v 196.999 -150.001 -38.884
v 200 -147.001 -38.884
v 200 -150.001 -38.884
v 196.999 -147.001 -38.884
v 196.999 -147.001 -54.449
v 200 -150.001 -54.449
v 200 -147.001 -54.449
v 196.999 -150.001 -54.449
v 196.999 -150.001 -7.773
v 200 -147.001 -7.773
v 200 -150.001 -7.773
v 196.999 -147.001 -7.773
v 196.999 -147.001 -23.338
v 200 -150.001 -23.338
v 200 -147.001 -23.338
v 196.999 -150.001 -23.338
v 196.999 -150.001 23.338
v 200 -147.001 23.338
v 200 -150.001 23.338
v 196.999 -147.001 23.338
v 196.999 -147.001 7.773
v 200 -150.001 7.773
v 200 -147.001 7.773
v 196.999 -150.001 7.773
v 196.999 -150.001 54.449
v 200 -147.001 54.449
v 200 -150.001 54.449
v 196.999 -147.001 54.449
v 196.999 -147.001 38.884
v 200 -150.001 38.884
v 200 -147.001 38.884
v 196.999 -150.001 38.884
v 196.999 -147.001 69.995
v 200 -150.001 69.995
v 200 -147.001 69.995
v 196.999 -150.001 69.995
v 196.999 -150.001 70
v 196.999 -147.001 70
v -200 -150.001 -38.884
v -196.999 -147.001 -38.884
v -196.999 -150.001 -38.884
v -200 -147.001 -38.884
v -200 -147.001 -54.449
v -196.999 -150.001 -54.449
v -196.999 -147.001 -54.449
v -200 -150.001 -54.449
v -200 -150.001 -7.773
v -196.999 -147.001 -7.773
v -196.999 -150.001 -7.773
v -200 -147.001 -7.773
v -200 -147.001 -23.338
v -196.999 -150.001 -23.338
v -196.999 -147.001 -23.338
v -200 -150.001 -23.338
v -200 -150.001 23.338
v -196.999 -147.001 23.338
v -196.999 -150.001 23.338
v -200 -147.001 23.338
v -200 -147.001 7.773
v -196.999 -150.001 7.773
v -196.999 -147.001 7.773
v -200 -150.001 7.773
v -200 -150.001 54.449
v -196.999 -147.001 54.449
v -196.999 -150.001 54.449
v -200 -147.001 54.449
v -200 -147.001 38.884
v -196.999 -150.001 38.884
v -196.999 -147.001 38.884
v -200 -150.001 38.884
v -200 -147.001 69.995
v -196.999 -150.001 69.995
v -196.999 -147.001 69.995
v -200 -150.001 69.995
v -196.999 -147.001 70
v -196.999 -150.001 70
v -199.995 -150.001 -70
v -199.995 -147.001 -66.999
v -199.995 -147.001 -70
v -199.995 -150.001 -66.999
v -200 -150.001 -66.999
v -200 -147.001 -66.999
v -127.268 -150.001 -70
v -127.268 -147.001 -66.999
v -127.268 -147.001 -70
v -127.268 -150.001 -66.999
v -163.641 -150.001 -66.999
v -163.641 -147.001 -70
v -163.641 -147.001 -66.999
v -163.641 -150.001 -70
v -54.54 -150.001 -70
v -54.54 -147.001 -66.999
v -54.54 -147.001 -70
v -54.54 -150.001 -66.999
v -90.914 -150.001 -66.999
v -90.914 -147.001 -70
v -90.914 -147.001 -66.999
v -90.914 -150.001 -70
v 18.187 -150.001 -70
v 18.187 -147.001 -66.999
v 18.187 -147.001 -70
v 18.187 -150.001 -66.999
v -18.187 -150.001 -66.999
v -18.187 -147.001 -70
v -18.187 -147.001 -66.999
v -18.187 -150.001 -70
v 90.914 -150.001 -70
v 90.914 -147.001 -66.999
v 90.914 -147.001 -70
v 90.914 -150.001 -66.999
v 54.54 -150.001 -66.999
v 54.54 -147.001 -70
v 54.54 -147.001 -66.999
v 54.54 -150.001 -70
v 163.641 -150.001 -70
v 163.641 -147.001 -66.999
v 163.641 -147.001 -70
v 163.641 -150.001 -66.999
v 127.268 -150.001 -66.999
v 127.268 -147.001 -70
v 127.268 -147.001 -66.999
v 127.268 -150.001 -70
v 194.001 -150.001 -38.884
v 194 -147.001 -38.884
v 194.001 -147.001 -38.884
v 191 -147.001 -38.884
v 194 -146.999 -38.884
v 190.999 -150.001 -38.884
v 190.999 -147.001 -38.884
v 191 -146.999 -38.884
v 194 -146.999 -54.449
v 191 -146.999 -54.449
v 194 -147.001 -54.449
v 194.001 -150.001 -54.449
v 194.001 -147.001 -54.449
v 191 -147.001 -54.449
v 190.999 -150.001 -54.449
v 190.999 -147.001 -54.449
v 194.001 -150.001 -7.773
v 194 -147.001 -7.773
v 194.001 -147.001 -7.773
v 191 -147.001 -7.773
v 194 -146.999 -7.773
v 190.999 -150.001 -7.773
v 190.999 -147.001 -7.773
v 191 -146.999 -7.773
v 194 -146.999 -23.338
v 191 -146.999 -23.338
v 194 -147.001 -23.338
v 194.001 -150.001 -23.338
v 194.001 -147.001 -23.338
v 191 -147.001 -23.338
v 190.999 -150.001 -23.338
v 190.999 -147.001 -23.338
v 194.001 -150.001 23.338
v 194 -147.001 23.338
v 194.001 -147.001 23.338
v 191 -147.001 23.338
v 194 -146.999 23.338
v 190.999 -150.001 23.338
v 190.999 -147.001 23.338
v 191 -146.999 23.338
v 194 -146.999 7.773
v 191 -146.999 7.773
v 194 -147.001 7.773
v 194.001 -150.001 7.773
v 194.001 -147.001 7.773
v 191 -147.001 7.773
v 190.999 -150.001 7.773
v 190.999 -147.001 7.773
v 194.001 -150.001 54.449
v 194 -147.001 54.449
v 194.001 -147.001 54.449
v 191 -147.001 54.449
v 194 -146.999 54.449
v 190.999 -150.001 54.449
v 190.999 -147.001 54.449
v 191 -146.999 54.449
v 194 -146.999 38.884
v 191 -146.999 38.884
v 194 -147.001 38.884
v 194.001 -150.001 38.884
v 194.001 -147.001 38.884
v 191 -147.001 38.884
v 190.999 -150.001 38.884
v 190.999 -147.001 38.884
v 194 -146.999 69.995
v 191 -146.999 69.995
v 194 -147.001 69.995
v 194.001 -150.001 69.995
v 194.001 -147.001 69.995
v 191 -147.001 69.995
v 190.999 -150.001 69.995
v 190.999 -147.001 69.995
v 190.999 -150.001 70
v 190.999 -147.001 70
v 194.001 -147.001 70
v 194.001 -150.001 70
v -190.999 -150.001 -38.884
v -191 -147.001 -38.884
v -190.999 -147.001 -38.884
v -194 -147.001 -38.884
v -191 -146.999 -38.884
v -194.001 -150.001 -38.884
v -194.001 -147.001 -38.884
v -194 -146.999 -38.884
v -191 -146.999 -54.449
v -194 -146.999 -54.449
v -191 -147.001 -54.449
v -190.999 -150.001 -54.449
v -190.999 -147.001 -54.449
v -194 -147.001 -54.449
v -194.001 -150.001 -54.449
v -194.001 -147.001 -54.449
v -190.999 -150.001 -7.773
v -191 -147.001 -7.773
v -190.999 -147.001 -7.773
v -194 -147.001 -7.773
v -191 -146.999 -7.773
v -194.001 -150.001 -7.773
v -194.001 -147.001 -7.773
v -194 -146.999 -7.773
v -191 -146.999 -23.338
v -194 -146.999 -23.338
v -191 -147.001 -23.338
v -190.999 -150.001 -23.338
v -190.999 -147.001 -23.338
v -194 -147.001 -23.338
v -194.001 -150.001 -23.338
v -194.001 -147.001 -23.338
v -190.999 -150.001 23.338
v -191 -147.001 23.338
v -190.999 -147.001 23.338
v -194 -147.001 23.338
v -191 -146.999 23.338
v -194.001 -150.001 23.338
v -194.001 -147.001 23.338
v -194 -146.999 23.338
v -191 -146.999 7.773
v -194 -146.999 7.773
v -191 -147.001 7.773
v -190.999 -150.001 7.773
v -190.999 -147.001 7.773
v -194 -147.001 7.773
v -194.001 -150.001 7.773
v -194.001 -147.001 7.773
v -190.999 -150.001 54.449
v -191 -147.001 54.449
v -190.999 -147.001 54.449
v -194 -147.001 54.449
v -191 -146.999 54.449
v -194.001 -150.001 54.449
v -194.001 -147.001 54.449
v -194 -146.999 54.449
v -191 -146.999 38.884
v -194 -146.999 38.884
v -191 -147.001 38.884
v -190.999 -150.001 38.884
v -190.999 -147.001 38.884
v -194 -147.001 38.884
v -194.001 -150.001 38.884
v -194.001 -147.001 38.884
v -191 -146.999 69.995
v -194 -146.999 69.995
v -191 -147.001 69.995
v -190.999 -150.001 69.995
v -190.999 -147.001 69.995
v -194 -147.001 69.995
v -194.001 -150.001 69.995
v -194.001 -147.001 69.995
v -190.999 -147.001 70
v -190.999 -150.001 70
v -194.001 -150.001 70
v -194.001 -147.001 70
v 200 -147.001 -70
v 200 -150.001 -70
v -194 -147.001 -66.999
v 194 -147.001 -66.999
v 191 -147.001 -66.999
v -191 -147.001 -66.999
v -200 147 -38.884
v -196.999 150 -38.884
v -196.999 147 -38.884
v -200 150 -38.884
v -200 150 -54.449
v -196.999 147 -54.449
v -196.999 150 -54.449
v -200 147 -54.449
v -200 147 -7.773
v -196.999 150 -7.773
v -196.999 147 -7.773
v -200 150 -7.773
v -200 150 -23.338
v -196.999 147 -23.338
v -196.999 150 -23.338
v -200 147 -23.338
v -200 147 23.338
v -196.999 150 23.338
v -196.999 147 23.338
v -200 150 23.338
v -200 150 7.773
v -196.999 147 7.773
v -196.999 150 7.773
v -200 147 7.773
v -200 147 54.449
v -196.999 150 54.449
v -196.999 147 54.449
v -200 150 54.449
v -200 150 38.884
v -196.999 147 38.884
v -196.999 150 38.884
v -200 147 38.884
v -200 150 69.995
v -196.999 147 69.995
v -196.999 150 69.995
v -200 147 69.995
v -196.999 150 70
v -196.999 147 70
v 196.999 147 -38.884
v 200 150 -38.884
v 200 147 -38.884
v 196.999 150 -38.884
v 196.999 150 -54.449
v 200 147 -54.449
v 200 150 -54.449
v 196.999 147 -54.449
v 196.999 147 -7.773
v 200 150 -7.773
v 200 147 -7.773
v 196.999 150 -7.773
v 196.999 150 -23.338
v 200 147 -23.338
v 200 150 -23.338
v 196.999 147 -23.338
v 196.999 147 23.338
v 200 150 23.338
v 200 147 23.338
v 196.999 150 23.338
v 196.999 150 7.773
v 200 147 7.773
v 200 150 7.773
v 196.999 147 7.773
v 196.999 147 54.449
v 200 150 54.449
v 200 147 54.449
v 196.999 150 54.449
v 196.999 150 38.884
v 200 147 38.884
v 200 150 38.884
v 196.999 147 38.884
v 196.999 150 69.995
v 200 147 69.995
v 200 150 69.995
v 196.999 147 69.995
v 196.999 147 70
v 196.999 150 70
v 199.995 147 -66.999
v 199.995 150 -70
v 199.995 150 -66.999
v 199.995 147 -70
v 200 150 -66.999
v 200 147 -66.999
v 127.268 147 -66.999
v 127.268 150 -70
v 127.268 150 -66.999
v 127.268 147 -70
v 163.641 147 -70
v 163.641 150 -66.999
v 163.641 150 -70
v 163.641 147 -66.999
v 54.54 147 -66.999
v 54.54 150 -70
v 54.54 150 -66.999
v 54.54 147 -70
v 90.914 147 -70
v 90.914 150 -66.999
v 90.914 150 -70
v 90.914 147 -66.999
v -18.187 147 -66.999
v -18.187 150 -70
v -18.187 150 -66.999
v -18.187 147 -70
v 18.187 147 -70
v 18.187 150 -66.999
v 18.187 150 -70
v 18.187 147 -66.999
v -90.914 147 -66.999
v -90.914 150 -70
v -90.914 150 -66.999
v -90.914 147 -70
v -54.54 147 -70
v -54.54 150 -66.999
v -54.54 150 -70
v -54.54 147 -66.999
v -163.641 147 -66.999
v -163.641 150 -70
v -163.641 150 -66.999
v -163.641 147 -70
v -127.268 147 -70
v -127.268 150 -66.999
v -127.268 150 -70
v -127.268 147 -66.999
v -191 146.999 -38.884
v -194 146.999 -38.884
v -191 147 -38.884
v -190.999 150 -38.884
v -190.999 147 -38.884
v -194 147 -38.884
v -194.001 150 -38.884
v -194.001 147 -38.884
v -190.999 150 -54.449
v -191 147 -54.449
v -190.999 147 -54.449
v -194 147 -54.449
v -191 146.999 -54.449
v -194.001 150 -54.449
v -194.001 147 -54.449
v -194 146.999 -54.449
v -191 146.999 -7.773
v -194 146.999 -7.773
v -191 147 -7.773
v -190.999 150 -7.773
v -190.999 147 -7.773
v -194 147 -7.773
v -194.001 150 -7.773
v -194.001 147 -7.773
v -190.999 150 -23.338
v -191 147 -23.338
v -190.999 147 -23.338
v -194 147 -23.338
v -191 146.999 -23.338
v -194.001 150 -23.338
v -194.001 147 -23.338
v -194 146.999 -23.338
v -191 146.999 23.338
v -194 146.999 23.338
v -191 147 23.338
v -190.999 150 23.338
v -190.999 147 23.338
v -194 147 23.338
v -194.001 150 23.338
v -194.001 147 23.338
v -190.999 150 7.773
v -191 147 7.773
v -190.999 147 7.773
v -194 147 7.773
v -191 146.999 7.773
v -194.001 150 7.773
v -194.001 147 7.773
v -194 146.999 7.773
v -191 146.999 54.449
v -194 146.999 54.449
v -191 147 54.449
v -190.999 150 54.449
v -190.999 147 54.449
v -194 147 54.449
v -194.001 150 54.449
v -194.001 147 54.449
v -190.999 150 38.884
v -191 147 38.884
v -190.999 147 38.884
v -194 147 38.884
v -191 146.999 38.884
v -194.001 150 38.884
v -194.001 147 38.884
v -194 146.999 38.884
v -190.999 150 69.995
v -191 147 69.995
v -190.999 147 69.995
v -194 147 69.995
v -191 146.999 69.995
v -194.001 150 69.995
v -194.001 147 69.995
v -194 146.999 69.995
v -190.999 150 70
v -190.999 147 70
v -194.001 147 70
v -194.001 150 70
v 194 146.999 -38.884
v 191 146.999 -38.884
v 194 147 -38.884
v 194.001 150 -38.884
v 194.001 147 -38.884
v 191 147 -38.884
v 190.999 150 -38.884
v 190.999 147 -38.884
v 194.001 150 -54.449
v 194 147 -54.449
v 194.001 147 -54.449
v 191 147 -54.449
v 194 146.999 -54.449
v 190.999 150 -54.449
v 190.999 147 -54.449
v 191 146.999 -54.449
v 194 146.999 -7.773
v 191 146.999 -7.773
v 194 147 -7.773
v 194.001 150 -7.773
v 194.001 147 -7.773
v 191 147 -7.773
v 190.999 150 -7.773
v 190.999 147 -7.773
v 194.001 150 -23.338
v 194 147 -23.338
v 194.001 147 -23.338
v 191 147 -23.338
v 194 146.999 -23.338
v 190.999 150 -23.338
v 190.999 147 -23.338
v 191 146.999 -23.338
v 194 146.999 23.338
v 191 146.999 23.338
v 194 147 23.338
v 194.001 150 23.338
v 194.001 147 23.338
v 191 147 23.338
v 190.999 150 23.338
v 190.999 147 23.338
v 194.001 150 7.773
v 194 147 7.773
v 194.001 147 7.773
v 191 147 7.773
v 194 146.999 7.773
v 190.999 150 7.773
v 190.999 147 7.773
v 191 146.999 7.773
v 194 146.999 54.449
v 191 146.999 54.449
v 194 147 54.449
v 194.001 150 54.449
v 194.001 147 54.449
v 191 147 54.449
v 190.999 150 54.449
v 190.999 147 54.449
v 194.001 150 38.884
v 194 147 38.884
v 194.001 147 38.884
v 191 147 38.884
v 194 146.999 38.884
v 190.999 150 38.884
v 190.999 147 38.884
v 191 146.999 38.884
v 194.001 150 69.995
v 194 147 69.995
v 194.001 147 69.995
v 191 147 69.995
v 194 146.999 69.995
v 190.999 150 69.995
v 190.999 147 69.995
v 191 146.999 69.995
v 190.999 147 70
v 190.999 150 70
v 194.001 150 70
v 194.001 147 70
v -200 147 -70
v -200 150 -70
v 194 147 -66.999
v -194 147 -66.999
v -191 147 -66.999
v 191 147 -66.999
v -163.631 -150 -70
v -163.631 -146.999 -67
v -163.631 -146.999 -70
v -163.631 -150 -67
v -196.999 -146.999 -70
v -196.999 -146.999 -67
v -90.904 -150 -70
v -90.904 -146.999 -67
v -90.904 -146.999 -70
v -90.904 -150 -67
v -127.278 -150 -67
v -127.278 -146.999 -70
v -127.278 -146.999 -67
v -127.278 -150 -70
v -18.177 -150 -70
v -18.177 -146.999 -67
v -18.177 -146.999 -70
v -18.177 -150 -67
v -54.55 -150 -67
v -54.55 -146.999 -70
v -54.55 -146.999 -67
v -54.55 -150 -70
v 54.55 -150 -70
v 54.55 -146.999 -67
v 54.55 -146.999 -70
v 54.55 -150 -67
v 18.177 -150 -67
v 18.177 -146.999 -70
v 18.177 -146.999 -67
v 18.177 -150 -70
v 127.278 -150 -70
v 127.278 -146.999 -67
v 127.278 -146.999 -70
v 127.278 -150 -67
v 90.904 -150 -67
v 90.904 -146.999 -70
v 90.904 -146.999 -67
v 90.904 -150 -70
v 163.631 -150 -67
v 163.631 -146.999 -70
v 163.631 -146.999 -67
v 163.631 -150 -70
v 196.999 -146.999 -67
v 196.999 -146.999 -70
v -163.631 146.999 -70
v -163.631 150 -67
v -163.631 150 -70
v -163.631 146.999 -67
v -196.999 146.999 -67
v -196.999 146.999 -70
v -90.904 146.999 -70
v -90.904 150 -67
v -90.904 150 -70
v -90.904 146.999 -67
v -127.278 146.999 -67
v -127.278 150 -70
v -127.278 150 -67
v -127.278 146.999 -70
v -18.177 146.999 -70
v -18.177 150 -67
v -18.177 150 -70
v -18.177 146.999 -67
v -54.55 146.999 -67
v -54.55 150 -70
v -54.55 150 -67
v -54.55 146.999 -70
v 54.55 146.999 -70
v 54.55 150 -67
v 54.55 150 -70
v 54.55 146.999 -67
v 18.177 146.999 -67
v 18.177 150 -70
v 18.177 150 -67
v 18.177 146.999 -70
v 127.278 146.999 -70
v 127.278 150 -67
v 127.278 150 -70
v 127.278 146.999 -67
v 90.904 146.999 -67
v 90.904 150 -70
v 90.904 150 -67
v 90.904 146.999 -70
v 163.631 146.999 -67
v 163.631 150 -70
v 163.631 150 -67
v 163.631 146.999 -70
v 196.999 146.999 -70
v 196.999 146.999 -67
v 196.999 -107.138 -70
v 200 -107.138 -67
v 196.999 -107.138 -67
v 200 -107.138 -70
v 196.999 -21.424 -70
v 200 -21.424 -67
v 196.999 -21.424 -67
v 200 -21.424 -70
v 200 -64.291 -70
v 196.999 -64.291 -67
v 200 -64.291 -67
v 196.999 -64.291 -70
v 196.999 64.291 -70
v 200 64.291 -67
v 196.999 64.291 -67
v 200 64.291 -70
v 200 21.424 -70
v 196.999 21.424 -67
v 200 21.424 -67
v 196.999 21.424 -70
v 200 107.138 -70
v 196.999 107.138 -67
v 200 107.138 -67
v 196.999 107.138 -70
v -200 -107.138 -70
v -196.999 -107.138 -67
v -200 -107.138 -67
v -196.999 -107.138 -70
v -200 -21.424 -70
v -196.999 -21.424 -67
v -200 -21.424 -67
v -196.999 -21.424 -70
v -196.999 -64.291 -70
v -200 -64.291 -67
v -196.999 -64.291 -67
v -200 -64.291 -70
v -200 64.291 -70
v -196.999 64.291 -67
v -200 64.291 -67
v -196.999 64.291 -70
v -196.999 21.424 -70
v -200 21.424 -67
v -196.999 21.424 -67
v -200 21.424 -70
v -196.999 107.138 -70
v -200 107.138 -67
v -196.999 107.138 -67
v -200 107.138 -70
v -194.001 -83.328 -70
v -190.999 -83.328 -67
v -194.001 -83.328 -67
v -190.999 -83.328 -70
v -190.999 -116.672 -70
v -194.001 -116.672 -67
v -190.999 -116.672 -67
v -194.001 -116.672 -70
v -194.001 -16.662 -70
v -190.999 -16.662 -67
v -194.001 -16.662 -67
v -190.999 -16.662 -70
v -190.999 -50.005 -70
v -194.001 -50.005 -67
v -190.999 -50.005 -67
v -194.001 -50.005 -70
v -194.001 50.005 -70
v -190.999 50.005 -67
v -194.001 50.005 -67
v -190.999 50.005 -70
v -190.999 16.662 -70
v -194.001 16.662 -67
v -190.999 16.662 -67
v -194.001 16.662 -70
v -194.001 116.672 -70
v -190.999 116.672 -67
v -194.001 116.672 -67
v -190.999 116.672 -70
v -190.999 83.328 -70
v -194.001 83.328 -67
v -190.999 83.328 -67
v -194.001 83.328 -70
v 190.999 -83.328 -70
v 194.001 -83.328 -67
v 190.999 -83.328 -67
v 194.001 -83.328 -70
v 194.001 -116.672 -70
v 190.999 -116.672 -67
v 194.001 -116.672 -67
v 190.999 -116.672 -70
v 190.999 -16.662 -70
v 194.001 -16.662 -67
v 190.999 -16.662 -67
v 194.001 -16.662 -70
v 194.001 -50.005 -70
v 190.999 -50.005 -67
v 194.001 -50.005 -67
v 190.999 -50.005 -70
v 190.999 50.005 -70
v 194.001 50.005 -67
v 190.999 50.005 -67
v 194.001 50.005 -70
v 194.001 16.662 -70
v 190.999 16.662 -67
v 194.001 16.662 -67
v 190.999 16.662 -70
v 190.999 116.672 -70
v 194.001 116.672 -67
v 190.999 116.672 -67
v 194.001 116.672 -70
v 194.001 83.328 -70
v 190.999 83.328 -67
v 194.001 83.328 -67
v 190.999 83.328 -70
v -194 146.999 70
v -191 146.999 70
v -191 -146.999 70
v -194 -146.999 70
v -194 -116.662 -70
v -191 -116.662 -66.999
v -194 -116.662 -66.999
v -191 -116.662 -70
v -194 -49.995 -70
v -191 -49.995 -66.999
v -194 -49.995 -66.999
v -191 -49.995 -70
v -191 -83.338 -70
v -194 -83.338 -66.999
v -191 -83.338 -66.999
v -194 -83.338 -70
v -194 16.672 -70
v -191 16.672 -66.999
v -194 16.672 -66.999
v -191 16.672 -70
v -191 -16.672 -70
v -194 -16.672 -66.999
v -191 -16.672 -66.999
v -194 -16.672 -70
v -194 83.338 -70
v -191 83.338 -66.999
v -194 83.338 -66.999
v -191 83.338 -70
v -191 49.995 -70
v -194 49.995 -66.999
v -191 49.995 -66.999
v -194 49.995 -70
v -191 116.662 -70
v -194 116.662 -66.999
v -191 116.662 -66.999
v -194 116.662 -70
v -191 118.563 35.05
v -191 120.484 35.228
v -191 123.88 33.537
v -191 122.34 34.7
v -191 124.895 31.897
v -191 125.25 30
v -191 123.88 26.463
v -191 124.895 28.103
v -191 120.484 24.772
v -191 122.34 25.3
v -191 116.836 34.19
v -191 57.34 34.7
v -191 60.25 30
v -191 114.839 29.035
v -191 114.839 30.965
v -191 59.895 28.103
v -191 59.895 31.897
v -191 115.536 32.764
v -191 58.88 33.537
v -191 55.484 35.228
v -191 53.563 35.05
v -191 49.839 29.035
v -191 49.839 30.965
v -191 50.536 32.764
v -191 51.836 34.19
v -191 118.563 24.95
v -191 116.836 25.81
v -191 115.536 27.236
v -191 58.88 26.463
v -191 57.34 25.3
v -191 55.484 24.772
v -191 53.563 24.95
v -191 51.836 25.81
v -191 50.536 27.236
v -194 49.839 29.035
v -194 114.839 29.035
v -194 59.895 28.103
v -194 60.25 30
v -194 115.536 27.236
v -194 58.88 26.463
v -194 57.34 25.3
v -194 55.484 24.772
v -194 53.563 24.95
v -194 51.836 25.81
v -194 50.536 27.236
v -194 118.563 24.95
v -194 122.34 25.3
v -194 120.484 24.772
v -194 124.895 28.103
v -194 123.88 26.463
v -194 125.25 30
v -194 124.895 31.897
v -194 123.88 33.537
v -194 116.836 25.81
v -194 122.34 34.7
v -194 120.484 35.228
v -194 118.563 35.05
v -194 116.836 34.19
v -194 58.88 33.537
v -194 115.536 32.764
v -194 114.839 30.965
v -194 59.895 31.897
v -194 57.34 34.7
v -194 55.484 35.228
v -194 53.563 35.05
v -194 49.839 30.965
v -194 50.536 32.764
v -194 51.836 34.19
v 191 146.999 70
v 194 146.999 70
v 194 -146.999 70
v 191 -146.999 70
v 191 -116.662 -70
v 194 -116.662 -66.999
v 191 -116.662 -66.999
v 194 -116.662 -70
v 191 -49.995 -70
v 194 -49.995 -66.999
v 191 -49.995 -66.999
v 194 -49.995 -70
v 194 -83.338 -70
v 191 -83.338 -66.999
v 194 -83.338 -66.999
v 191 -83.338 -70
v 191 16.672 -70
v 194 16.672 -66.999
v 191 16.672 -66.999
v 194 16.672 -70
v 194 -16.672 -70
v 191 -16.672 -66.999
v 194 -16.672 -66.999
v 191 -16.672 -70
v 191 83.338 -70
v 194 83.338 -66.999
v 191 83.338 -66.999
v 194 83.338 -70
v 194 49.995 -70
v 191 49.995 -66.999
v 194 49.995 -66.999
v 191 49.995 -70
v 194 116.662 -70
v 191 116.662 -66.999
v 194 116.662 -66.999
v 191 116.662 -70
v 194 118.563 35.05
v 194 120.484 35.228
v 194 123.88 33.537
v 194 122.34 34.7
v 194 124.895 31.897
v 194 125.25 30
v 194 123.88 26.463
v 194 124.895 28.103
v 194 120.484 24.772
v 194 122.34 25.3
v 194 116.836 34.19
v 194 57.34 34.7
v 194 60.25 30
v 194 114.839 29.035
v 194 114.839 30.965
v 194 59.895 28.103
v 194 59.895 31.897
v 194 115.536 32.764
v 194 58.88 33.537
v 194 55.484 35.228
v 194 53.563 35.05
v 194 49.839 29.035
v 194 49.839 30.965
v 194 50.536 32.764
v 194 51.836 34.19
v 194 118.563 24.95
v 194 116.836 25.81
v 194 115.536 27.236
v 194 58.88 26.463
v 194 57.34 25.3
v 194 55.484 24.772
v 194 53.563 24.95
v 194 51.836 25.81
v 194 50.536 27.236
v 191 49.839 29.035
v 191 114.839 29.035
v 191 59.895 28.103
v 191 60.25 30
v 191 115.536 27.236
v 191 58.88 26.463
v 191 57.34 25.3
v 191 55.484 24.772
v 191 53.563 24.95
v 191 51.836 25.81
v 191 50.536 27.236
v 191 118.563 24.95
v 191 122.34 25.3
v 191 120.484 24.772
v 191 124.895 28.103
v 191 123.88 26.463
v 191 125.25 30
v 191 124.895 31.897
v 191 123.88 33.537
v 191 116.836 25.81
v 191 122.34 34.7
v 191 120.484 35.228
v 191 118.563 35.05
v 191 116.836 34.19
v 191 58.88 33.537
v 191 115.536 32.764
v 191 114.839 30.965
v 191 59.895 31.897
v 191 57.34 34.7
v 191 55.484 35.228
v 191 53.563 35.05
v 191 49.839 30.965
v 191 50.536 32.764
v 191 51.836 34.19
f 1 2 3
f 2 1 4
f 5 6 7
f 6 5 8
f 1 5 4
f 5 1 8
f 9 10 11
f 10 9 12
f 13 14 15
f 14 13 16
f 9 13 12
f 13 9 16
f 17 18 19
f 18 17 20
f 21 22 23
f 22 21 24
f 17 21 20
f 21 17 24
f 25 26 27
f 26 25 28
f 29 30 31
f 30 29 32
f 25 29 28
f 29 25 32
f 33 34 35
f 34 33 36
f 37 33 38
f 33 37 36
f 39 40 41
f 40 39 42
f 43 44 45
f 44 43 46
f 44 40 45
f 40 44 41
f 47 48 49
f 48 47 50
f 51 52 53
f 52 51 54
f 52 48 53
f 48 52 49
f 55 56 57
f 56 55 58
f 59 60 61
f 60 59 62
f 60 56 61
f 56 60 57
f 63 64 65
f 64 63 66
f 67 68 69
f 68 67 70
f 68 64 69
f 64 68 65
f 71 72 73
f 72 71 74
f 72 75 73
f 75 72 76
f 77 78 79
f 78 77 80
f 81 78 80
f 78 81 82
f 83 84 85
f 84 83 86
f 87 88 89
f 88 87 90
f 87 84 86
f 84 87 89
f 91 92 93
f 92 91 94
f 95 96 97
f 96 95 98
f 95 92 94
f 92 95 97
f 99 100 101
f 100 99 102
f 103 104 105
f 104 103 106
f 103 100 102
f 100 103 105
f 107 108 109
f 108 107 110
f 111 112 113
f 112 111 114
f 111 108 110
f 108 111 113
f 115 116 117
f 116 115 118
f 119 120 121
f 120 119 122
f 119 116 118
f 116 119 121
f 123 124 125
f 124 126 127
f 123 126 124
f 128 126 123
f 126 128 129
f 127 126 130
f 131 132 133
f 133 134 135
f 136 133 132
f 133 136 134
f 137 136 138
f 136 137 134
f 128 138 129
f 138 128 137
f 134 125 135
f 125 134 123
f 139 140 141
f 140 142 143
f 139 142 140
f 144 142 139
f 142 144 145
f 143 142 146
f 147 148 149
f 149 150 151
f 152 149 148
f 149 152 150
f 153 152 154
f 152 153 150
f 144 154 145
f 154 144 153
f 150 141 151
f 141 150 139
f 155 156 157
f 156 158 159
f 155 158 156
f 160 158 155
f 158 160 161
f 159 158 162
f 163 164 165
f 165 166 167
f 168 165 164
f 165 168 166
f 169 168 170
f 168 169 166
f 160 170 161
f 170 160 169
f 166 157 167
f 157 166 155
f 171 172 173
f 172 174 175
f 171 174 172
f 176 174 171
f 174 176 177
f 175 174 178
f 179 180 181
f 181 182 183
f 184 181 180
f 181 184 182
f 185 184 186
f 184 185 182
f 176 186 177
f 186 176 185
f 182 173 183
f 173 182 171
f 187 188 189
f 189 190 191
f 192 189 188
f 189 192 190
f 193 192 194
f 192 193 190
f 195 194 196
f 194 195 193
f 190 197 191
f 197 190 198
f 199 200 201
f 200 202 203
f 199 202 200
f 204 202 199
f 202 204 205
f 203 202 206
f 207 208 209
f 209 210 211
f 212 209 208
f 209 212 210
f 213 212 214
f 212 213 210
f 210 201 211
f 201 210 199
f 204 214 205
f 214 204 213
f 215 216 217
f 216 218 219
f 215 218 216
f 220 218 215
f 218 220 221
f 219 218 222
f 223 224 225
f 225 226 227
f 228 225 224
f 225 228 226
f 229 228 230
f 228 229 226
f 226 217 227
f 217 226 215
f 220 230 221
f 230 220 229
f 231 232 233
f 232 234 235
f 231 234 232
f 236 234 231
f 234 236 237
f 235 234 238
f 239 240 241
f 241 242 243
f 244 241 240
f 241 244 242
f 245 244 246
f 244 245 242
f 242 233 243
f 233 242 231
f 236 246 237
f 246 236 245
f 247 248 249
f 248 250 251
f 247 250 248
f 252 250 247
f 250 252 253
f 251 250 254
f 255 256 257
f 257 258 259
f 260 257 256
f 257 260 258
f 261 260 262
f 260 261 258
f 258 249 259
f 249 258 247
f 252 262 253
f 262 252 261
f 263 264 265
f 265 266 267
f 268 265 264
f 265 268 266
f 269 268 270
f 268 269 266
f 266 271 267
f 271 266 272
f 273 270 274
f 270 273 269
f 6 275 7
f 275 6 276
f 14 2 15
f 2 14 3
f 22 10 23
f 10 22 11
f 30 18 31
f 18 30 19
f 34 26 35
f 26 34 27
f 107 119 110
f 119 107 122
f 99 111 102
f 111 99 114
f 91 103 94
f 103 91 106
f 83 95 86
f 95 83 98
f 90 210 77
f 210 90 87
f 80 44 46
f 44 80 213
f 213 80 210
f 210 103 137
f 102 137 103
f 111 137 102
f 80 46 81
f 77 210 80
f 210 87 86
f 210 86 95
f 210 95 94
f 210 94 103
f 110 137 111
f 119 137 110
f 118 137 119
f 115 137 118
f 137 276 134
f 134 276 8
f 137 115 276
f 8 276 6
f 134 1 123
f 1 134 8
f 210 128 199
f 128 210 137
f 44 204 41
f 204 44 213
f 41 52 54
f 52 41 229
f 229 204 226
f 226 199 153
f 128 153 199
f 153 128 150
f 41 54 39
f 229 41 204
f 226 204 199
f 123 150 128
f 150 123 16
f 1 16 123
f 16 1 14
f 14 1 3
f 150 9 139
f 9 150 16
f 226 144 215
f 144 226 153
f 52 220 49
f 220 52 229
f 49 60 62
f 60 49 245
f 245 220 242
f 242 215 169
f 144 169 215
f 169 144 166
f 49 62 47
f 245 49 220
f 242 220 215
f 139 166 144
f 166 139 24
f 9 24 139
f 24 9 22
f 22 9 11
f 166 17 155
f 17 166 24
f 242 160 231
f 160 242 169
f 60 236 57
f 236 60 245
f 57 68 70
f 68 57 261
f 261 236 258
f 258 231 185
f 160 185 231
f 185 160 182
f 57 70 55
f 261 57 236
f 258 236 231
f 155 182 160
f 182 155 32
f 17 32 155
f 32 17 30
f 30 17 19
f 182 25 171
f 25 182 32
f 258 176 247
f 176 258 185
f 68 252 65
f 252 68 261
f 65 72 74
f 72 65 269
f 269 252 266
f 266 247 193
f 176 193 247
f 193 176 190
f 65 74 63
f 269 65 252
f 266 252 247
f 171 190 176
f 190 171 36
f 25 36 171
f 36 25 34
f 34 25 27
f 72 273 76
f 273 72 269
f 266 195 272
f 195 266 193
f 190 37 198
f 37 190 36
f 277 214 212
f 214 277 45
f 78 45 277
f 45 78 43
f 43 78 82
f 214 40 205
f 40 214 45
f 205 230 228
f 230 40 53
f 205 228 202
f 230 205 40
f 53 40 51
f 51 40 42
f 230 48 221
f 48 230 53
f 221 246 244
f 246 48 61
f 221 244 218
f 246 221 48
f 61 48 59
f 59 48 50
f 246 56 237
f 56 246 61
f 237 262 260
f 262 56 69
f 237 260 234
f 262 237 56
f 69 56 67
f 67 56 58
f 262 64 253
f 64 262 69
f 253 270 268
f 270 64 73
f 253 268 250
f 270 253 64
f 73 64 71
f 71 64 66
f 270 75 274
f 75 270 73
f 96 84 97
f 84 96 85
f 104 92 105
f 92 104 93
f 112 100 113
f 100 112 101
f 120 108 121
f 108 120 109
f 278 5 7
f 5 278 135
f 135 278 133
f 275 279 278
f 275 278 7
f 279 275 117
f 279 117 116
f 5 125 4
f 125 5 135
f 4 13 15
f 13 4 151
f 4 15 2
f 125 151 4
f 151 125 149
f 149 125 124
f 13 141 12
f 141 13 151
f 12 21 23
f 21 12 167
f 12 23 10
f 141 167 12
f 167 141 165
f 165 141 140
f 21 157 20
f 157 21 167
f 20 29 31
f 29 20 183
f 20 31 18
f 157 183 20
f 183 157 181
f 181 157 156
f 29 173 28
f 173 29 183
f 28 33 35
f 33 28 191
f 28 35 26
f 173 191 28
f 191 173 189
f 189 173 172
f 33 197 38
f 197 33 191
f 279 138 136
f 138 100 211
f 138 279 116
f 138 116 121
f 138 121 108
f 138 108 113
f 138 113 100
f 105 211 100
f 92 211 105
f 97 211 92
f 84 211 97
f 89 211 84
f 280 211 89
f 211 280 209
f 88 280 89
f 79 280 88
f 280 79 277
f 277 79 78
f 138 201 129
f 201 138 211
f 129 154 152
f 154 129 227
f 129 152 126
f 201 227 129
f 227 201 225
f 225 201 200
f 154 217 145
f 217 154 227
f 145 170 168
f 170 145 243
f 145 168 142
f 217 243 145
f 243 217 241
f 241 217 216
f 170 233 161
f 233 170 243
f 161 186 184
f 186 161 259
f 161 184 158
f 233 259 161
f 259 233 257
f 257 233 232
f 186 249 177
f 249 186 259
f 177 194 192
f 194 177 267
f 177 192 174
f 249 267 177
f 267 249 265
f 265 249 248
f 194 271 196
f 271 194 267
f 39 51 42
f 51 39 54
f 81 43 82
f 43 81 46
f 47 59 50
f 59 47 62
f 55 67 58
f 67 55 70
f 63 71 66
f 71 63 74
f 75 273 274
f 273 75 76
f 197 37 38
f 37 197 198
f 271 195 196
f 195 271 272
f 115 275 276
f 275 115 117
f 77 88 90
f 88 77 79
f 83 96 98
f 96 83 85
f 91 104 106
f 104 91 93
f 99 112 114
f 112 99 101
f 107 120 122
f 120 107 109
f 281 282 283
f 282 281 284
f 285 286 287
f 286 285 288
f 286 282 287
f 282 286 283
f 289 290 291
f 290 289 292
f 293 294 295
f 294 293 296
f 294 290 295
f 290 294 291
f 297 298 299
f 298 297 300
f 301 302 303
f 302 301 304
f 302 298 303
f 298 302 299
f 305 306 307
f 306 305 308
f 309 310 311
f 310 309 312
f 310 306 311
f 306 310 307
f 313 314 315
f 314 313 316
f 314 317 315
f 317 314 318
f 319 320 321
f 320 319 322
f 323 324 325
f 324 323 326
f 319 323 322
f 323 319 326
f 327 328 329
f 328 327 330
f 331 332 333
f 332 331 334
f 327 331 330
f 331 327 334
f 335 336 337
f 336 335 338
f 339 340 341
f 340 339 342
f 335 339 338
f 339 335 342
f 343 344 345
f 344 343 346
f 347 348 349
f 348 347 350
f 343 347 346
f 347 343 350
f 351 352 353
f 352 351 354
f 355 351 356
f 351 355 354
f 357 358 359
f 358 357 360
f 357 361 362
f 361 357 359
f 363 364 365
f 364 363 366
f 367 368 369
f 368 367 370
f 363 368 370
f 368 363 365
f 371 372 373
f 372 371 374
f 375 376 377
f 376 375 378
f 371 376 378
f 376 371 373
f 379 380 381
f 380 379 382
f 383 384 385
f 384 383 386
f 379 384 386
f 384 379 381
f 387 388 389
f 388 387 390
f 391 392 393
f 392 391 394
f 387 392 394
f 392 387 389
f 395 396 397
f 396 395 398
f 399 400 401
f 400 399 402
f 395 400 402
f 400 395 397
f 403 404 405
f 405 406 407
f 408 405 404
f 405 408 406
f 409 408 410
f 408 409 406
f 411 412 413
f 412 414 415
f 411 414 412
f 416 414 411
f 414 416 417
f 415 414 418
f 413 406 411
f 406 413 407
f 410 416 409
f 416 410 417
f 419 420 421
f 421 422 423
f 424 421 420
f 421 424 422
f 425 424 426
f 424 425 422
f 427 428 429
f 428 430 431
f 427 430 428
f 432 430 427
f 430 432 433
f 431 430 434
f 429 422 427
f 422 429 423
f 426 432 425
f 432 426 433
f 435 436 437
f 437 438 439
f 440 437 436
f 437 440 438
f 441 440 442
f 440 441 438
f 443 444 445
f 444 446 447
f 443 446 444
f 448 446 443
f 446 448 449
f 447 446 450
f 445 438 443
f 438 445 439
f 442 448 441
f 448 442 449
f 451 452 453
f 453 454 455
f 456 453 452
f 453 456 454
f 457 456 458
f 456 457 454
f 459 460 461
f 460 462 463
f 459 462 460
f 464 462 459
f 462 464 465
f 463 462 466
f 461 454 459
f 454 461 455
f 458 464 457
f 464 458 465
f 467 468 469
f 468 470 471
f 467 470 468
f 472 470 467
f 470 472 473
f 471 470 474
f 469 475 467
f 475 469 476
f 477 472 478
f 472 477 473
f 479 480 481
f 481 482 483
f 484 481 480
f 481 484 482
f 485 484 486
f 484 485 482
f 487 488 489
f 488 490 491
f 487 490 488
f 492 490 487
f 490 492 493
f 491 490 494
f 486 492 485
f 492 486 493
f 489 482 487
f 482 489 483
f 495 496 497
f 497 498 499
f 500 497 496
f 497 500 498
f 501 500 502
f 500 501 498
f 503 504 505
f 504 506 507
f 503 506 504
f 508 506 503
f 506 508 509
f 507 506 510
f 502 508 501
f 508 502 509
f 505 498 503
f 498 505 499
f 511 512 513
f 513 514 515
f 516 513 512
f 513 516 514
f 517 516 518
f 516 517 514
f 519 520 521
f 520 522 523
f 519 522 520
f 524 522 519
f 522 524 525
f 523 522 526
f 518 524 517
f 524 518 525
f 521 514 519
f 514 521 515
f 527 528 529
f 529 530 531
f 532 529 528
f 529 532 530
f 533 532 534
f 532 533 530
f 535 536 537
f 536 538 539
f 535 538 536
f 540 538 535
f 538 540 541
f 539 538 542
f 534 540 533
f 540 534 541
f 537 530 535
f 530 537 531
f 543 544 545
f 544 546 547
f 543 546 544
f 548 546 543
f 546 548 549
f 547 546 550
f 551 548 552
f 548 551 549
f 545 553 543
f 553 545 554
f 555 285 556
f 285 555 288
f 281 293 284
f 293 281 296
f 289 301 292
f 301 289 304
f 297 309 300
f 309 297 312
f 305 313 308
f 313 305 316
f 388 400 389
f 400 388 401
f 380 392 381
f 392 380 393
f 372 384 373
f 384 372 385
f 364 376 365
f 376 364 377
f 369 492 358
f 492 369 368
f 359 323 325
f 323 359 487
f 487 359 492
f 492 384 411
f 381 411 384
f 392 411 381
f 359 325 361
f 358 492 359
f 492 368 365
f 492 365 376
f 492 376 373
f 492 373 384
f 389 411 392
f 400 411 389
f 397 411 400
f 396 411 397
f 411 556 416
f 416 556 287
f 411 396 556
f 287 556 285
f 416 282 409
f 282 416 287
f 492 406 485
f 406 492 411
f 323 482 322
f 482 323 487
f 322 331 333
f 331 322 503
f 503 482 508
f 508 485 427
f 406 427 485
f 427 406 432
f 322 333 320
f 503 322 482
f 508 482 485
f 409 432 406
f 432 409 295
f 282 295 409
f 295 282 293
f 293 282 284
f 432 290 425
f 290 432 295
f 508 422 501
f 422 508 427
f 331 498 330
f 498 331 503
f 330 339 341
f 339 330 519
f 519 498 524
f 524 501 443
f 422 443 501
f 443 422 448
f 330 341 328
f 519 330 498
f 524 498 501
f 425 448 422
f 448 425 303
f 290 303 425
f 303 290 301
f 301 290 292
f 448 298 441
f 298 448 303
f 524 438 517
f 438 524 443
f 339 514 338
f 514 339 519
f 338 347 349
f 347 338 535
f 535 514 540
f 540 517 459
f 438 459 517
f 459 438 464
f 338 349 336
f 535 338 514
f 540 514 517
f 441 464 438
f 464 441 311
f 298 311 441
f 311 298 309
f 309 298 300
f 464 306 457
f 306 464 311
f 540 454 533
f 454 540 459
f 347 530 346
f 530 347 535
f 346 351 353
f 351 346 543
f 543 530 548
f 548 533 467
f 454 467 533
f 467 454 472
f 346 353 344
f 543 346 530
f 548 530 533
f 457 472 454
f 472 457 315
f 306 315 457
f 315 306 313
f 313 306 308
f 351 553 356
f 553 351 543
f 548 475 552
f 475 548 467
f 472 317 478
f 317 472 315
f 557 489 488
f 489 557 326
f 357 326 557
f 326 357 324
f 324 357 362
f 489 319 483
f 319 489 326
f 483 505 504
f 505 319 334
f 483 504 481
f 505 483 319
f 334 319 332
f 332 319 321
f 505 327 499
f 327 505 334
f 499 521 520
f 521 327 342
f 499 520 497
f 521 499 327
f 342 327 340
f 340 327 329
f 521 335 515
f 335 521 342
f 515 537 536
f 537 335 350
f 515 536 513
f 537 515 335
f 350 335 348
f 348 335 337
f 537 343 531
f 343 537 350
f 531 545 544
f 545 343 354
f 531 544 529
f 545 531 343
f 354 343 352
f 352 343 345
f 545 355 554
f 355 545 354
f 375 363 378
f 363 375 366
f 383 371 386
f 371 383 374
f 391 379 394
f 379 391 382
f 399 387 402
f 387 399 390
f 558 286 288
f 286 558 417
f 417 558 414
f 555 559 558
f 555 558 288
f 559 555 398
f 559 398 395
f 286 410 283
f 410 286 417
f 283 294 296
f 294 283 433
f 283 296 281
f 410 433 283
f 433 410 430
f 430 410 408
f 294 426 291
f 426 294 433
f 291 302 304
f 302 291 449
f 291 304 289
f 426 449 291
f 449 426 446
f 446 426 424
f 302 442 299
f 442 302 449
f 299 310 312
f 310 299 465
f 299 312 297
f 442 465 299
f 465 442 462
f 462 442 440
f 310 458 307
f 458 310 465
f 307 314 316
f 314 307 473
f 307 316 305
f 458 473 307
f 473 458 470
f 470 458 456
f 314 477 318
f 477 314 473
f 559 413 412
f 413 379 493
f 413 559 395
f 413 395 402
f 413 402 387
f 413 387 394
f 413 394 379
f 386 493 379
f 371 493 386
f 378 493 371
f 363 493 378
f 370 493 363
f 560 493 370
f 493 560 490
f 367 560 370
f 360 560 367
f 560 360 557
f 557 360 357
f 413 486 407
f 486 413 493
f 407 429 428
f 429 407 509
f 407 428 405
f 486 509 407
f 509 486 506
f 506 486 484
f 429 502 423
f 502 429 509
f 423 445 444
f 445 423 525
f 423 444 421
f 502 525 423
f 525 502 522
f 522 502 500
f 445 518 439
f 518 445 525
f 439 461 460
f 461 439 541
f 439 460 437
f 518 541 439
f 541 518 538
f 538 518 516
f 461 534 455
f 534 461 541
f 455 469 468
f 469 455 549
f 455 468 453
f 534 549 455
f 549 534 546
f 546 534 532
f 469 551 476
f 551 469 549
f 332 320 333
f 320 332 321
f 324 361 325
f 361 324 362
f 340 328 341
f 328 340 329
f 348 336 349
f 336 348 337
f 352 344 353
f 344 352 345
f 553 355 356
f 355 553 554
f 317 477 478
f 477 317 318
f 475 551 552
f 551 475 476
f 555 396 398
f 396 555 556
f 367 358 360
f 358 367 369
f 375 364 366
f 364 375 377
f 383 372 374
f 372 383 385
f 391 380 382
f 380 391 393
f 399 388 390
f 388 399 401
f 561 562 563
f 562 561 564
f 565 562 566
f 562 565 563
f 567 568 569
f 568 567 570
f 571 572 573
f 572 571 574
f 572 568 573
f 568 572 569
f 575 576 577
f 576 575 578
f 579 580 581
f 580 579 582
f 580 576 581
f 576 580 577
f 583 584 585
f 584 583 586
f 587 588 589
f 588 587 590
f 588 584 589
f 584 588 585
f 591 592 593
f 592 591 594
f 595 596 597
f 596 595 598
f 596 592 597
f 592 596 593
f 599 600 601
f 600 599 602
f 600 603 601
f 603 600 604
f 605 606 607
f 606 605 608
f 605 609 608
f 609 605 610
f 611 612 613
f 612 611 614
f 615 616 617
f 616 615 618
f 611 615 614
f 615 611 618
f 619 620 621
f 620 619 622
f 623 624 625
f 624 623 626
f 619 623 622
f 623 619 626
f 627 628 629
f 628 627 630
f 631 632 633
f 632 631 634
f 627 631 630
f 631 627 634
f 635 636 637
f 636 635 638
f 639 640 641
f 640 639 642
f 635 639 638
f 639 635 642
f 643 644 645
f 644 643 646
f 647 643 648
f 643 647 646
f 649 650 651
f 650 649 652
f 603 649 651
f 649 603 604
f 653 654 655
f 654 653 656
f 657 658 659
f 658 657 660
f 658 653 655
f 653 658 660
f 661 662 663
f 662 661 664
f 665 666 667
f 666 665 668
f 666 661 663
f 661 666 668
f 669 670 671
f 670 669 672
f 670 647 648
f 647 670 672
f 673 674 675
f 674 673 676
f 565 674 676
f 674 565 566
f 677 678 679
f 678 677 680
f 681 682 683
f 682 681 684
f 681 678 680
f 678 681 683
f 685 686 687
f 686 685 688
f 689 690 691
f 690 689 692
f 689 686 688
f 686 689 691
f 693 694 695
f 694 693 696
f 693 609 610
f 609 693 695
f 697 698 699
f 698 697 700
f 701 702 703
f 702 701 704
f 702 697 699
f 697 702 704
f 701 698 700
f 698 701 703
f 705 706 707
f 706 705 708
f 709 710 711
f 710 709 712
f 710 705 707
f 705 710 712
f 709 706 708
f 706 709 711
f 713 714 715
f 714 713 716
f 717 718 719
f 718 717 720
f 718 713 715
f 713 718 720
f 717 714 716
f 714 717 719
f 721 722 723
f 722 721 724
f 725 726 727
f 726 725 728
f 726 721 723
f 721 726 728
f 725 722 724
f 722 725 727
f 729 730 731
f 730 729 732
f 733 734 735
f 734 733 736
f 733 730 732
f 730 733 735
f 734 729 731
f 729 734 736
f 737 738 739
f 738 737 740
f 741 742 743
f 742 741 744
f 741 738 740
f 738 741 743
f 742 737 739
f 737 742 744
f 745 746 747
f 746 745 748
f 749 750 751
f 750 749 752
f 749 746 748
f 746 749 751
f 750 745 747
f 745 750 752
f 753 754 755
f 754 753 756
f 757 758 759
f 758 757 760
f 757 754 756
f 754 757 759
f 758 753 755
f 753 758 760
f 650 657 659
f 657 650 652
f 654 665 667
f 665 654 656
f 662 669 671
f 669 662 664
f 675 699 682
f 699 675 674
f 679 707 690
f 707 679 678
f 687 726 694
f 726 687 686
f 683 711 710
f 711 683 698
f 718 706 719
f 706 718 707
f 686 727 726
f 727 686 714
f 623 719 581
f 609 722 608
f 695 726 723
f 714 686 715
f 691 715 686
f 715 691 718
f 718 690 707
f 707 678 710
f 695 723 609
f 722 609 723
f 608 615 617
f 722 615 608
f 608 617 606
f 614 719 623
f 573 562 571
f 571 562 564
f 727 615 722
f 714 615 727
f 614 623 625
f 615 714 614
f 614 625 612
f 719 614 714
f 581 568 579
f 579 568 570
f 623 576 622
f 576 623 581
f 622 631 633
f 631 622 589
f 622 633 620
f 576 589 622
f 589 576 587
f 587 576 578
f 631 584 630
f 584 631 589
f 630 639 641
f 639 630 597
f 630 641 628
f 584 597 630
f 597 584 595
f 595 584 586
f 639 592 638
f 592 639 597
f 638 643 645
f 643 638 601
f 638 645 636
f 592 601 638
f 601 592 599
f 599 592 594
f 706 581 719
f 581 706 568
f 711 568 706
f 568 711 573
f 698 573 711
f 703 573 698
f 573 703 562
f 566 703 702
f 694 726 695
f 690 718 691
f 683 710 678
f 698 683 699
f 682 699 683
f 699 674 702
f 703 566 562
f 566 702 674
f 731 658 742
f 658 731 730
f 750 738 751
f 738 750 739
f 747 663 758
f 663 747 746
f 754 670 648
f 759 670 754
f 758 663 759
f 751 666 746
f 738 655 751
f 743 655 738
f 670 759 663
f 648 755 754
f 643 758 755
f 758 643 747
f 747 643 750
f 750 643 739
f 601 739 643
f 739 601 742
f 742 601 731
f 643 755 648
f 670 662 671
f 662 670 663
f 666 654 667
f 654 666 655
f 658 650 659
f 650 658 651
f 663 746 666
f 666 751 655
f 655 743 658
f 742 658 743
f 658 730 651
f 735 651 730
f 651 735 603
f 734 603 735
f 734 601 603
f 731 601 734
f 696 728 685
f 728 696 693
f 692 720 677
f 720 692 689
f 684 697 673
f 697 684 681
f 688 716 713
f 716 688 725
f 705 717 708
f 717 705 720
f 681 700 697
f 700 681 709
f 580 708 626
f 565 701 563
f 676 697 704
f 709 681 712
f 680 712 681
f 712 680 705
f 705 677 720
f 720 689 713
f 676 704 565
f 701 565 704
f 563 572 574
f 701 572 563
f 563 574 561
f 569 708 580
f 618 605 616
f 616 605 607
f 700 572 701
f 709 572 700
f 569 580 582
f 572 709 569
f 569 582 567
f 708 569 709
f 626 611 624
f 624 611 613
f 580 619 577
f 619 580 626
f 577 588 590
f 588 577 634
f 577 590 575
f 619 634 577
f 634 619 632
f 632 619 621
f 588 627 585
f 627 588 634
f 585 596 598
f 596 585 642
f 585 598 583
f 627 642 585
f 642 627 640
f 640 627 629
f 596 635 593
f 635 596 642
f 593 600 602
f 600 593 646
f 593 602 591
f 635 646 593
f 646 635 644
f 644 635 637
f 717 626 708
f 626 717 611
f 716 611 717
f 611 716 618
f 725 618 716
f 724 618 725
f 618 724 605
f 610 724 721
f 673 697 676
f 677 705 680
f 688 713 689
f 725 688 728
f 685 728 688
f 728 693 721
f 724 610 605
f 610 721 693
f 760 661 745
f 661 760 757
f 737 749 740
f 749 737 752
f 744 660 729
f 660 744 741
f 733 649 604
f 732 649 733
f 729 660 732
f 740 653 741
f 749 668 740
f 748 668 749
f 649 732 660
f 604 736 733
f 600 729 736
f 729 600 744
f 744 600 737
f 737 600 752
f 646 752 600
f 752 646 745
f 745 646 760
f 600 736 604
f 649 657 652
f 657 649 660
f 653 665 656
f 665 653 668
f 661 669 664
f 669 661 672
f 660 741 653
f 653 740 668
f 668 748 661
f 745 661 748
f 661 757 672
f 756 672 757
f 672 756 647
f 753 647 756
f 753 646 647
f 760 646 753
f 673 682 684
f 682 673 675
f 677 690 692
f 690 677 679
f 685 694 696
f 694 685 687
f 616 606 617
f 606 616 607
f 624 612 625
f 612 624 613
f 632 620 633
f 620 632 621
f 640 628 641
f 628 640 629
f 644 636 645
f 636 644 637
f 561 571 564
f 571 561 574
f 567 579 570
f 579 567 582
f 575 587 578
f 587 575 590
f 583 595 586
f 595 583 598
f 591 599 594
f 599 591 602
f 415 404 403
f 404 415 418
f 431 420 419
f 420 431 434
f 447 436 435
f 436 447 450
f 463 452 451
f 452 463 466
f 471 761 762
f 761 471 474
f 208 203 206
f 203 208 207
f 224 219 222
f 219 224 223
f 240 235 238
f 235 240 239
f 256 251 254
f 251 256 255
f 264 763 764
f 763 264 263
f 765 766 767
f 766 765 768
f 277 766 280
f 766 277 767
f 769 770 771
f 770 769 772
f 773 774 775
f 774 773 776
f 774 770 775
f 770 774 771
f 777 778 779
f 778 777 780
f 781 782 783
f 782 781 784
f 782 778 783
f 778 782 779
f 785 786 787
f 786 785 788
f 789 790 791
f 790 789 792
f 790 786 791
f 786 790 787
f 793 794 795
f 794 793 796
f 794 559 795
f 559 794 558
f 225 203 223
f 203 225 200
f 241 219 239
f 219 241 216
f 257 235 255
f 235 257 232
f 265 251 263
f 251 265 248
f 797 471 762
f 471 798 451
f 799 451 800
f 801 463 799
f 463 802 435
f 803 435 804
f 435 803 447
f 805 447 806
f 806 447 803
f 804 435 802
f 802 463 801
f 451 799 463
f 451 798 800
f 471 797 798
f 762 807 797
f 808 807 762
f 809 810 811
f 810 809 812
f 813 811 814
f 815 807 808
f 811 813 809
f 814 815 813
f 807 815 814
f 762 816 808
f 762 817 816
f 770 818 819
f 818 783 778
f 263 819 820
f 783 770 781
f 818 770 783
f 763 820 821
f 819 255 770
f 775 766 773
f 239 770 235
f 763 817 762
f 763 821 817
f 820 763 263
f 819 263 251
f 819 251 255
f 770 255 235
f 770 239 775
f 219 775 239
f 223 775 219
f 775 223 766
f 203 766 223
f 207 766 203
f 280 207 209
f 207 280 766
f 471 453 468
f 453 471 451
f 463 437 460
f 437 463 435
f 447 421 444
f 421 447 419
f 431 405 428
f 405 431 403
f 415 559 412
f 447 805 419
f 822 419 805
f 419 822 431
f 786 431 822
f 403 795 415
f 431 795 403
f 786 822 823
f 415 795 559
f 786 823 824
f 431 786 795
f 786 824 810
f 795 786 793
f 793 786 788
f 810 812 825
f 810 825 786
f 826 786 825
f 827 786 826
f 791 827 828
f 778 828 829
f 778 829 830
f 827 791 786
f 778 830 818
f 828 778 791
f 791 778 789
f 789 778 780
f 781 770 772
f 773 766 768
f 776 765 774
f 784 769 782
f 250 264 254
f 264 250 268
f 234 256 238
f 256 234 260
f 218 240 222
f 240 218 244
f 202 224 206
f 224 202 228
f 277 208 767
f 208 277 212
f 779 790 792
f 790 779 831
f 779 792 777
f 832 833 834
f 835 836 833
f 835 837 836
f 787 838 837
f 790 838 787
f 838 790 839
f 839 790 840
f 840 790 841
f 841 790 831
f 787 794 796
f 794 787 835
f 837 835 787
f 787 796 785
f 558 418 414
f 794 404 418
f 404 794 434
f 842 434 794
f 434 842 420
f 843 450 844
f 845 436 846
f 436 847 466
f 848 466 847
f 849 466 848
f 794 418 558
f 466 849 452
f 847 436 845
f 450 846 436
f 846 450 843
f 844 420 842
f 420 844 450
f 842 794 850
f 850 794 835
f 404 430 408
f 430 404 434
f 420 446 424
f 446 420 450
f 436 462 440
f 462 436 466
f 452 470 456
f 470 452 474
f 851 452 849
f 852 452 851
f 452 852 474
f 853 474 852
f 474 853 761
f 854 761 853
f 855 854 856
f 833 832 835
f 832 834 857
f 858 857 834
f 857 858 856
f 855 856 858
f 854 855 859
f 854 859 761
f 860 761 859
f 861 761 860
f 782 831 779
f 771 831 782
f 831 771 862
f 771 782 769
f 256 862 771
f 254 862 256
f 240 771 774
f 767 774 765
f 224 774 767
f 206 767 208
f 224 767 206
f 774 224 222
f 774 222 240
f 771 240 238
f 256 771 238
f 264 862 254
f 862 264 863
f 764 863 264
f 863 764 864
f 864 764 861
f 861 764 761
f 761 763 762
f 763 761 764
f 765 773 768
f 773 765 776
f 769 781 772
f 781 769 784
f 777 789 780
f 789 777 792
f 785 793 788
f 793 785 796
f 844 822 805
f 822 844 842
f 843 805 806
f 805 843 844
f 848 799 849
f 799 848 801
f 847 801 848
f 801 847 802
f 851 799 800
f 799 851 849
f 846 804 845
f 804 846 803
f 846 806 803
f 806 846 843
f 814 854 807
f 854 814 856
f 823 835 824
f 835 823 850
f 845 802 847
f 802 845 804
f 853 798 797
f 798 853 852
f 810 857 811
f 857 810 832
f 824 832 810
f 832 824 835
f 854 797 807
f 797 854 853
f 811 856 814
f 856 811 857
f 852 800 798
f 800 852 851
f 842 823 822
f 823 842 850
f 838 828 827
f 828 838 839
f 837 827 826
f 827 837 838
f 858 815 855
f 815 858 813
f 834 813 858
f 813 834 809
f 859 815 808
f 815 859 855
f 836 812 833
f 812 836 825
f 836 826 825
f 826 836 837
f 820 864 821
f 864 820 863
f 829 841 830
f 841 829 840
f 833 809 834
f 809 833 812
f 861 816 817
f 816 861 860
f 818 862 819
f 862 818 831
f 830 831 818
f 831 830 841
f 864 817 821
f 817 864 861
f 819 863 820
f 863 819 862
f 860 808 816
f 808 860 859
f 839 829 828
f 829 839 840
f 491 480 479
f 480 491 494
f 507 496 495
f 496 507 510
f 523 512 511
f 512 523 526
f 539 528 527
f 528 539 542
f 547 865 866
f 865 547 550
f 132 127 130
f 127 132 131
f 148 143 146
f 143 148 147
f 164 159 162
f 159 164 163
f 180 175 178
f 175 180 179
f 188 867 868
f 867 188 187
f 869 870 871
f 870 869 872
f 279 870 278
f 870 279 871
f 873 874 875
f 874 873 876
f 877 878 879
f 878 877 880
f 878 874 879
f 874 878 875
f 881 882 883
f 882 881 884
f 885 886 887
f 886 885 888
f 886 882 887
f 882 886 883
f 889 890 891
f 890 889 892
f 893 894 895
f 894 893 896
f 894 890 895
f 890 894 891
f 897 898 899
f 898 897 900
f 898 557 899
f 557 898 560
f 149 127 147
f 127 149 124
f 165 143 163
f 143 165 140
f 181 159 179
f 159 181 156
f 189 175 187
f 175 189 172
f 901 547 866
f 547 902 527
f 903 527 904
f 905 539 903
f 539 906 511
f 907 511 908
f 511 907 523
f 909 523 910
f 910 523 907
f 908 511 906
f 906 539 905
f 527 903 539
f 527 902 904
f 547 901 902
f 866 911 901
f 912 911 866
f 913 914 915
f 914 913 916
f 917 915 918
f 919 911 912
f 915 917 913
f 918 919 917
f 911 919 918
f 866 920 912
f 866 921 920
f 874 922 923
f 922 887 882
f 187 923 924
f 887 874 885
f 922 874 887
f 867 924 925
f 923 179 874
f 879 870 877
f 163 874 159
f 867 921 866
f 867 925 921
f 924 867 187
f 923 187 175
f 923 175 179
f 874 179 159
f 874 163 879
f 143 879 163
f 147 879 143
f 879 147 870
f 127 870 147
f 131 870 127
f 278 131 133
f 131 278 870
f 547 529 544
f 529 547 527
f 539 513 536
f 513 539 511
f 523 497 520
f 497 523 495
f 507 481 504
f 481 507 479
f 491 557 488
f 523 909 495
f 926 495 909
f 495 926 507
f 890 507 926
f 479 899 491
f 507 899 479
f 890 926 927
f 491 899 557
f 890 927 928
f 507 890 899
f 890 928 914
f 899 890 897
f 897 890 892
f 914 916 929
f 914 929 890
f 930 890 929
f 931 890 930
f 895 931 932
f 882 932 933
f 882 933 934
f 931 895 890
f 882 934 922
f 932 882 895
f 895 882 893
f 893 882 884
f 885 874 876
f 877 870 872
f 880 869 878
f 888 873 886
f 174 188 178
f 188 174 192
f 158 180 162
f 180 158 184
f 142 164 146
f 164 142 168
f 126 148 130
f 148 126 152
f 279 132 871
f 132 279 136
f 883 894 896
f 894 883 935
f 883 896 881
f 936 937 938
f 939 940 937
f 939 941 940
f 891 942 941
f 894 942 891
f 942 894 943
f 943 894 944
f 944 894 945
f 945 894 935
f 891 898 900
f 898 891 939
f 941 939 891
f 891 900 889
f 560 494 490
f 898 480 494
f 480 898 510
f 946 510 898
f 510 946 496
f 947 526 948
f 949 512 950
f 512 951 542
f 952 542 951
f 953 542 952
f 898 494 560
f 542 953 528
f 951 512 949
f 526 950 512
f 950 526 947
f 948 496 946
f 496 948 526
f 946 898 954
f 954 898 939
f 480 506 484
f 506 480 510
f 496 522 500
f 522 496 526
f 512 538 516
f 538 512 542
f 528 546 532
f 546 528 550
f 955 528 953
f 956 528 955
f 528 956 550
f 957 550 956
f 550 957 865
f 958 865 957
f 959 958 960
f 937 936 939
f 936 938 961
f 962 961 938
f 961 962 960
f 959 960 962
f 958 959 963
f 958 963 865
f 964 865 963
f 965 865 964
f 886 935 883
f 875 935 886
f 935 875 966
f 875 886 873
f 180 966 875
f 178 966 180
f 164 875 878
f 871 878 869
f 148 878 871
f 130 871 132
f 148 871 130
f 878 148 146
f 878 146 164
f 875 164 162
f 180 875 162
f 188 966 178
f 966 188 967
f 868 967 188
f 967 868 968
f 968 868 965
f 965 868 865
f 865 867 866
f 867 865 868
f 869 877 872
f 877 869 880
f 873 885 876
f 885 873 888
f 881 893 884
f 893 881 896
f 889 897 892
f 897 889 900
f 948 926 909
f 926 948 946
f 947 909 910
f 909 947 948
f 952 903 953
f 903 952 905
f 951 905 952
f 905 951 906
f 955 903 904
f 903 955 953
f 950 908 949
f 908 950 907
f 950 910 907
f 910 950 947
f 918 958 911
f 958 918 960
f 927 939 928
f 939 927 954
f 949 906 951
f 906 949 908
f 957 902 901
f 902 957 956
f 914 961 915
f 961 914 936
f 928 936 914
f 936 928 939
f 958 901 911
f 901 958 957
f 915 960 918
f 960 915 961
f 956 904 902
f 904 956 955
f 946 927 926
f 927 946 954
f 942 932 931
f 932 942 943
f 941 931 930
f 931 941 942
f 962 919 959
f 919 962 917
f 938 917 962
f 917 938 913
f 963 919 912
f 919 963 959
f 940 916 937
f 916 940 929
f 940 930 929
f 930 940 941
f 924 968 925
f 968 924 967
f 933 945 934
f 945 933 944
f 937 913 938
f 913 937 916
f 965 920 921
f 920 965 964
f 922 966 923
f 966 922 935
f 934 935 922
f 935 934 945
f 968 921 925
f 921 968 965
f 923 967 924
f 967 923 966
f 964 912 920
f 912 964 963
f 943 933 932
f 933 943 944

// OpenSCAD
// file: params.scad
// arguments
material_thickness=3;
h = 200;
w = 400;
d = 300;

lid_h = 60;

// calculated
bottom_h = h-lid_h;

rear_strut_sagitta_ratio=3.5;
rear_strut_bottom_dx = 120;
rear_strut_bottom_dy = 30;
rear_strut_top_dx = 40;
rear_strut_top_dy = 0;
rear_strut_max_angle = 152.5;


rear_strut_delta_x = abs(rear_strut_bottom_dx - rear_strut_top_dx);
rear_strut_delta_y = abs((bottom_h / 2 - rear_strut_bottom_dy) + (lid_h / 2 - rear_strut_top_dy));
rear_strut_length = sqrt(pow(rear_strut_delta_x, 2) + pow(rear_strut_delta_y, 2));
rear_strut_init_angle = asin(rear_strut_delta_y / rear_strut_length);
// rear_strut_max_angle = rear_strut_init_angle;


front_strut_bottom_dx = 55;
front_strut_bottom_dy = 30;
front_strut_top_dx = -120;
front_strut_top_dy = 0;

front_strut_delta_x = abs(front_strut_bottom_dx - front_strut_top_dx);
front_strut_delta_y = abs((bottom_h / 2 - front_strut_bottom_dy) + (lid_h / 2 - front_strut_top_dy));
front_strut_length = sqrt(pow(front_strut_delta_x, 2) + pow(front_strut_delta_y, 2));
front_strut_init_angle = asin(front_strut_delta_y / front_strut_length);
echo("expected front strut init angle:", front_strut_init_angle);

bottom_bar = abs(front_strut_bottom_dx - rear_strut_bottom_dx);
diagonal_len = sqrt(pow(rear_strut_length, 2) + pow(bottom_bar, 2) - 2*rear_strut_length*bottom_bar*cos(rear_strut_max_angle));

echo("Diagonal len:", diagonal_len);

top_bar = abs(front_strut_top_dx - rear_strut_top_dx);
theta_upper = acos(
  (pow(front_strut_length, 2) + pow(diagonal_len, 2) - pow(top_bar, 2))
  /(2*front_strut_length*diagonal_len)
);
x = 
  (pow(diagonal_len, 2) + pow(bottom_bar, 2) - pow(rear_strut_length, 2))
  /(2*diagonal_len*bottom_bar);
theta_lower = acos(min(max(x, -1), 1));
echo("theta_lower:", theta_lower);

front_strut_max_angle = theta_lower + theta_upper;
echo ("front_strut_max_angle", front_strut_max_angle);
// main file
include <params.scad>

module sawtooth(tab_size, tab_spacing, num_tabs) {
  for (i=[0:num_tabs-1]) {
    translate([(i - floor(num_tabs/2)) * 2 * tab_size + (num_tabs % 2 == 1 ? tab_size : 0), 0, 0]) 
    cube(size=[tab_size + 0.01, material_thickness+0.001, material_thickness*2], center=true);
  }
}

module front() {
  color([255/255, 0/255, 0/255]) {
    difference() {
      cube(size=[w, bottom_h, material_thickness], center=true);
      for (a = [0, 180]) {
        rotate([0, a, 0]) {
          translate([w/2 - material_thickness/2, 0, 0]) {
            rotate([0, 0, 90]) sawtooth(bottom_h/9, 0, 5);
          }
        }
      }
      translate([0, -bottom_h/2 + material_thickness/2, 0]) sawtooth(w/11, 0, 6);

      for (a = [0, 180]) {
        rotate([0, a, 0]) {
          translate([w/2 - material_thickness/2 - 2*material_thickness, 0, 0]) {
            rotate([0, 0, 90]) sawtooth(bottom_h/9, 0, 5);
          }
        }
      }
    }
  }
}

module back() {
  color([255/255, 0/255, 0/255]) difference() {
    cube(size=[w, bottom_h, material_thickness], center=true);
    for (a = [0, 180]) {
      rotate([0, a, 0]) {
        translate([w/2 - material_thickness/2, 0, 0]) {
          rotate([0, 0, 90]) sawtooth(bottom_h/9, 0, 5);
        }
      }
    }

    translate([0, -bottom_h/2+material_thickness/2, 0]) sawtooth(w/11, 0, 6);
    
    for (a = [0, 180]) {
      rotate([0, a, 0]) {
        translate([w/2 - material_thickness/2 - 2*material_thickness, 0, 0]) {
          rotate([0, 0, 90]) sawtooth(bottom_h/9, 0, 5);
        }
      }
    }
    
  }
}

module side() {
  color([0/255, 255/255, 0/255]) {
    difference() {
      cube(size=[d, bottom_h, material_thickness], center=true);
      for (a = [0, 180]) {
        rotate([0, a, 0]) {
          translate([d/2 - material_thickness/2, 0, 0]) {
            rotate([0, 0, 90]) sawtooth(bottom_h/9, 0, 6);
          }
        }
      }

      translate([0, -bottom_h/2 + material_thickness/2, 0]) sawtooth(d/7, 0, 4);
    }
  }
}

module bottom() {
  color([0/255, 0/255, 255/255]) {
    difference() {
      cube(size=[w, d, material_thickness], center=true);
      translate([0, -d/2 + material_thickness/2, 0]) sawtooth(w/11, 0, 7);
      translate([0, d/2 - material_thickness/2, 0]) sawtooth(w/11, 0, 7);
      for (a = [0, 180]) rotate([0, a, 0]) {
        translate([w/2 - material_thickness/2, 0, 0]) rotate([0, 0, 90]) sawtooth(d/7, 0, 5);
      }
      
      for (a = [0, 180]) rotate([0, a, 0]) {
        translate([-w/2 + material_thickness/2 + 2*material_thickness, 0, 0]) rotate([0, 0, 90]) sawtooth(d/9, 0, 5);
      }
    }
  }
}

module retainer() {
  color([125/255, 125/255, 0/255]) {
    difference () {
      cube(size=[d, bottom_h, material_thickness], center=true);

      for (a = [0, 180]) {
        rotate([0, a, 0]) {
          translate([d/2 - material_thickness/2, 0, 0]) {
            rotate([0, 0, 90]) sawtooth(bottom_h/9, 0, 5);
          }
        }
      }

      translate([0, -bottom_h/2 + material_thickness/2, 0]) sawtooth(d/9, 0, 6);

      translate([rear_strut_bottom_dx, rear_strut_bottom_dy, 0]) cylinder(r=5.25, h=material_thickness*2, center=true);
      translate([front_strut_bottom_dx, front_strut_bottom_dy, 0]) cylinder(r=5.25, h=material_thickness*2, center=true);
    }
  }
}

module complete_box() {
  translate([0, -d/2 + material_thickness/2 - 0.001, 0]) rotate([90, 0, 0]) front();
  translate([0, d/2 - material_thickness/2, 0]) rotate([0, 0, 180]) rotate([90, 0, 0]) back();
  // translate([-w/2 + material_thickness/2, 0, 0]) rotate([0, 0, -90]) rotate([90, 0, 0]) side();
  // translate([w/2 - material_thickness/2, 0, 0]) rotate([0, 0, 90]) rotate([90, 0, 0]) side();
  translate([0, 0, -bottom_h/2 + material_thickness/2]) bottom();

  translate([-w/2 + material_thickness/2 + 2*material_thickness, 0, 0]) rotate([0, 0, 90]) rotate([90, 0, 0]) retainer();
  translate([w/2 - material_thickness/2 - 2*material_thickness, 0, 0]) rotate([0, 0, -90]) rotate([90, 0, 180]) retainer();
}

complete_box();
